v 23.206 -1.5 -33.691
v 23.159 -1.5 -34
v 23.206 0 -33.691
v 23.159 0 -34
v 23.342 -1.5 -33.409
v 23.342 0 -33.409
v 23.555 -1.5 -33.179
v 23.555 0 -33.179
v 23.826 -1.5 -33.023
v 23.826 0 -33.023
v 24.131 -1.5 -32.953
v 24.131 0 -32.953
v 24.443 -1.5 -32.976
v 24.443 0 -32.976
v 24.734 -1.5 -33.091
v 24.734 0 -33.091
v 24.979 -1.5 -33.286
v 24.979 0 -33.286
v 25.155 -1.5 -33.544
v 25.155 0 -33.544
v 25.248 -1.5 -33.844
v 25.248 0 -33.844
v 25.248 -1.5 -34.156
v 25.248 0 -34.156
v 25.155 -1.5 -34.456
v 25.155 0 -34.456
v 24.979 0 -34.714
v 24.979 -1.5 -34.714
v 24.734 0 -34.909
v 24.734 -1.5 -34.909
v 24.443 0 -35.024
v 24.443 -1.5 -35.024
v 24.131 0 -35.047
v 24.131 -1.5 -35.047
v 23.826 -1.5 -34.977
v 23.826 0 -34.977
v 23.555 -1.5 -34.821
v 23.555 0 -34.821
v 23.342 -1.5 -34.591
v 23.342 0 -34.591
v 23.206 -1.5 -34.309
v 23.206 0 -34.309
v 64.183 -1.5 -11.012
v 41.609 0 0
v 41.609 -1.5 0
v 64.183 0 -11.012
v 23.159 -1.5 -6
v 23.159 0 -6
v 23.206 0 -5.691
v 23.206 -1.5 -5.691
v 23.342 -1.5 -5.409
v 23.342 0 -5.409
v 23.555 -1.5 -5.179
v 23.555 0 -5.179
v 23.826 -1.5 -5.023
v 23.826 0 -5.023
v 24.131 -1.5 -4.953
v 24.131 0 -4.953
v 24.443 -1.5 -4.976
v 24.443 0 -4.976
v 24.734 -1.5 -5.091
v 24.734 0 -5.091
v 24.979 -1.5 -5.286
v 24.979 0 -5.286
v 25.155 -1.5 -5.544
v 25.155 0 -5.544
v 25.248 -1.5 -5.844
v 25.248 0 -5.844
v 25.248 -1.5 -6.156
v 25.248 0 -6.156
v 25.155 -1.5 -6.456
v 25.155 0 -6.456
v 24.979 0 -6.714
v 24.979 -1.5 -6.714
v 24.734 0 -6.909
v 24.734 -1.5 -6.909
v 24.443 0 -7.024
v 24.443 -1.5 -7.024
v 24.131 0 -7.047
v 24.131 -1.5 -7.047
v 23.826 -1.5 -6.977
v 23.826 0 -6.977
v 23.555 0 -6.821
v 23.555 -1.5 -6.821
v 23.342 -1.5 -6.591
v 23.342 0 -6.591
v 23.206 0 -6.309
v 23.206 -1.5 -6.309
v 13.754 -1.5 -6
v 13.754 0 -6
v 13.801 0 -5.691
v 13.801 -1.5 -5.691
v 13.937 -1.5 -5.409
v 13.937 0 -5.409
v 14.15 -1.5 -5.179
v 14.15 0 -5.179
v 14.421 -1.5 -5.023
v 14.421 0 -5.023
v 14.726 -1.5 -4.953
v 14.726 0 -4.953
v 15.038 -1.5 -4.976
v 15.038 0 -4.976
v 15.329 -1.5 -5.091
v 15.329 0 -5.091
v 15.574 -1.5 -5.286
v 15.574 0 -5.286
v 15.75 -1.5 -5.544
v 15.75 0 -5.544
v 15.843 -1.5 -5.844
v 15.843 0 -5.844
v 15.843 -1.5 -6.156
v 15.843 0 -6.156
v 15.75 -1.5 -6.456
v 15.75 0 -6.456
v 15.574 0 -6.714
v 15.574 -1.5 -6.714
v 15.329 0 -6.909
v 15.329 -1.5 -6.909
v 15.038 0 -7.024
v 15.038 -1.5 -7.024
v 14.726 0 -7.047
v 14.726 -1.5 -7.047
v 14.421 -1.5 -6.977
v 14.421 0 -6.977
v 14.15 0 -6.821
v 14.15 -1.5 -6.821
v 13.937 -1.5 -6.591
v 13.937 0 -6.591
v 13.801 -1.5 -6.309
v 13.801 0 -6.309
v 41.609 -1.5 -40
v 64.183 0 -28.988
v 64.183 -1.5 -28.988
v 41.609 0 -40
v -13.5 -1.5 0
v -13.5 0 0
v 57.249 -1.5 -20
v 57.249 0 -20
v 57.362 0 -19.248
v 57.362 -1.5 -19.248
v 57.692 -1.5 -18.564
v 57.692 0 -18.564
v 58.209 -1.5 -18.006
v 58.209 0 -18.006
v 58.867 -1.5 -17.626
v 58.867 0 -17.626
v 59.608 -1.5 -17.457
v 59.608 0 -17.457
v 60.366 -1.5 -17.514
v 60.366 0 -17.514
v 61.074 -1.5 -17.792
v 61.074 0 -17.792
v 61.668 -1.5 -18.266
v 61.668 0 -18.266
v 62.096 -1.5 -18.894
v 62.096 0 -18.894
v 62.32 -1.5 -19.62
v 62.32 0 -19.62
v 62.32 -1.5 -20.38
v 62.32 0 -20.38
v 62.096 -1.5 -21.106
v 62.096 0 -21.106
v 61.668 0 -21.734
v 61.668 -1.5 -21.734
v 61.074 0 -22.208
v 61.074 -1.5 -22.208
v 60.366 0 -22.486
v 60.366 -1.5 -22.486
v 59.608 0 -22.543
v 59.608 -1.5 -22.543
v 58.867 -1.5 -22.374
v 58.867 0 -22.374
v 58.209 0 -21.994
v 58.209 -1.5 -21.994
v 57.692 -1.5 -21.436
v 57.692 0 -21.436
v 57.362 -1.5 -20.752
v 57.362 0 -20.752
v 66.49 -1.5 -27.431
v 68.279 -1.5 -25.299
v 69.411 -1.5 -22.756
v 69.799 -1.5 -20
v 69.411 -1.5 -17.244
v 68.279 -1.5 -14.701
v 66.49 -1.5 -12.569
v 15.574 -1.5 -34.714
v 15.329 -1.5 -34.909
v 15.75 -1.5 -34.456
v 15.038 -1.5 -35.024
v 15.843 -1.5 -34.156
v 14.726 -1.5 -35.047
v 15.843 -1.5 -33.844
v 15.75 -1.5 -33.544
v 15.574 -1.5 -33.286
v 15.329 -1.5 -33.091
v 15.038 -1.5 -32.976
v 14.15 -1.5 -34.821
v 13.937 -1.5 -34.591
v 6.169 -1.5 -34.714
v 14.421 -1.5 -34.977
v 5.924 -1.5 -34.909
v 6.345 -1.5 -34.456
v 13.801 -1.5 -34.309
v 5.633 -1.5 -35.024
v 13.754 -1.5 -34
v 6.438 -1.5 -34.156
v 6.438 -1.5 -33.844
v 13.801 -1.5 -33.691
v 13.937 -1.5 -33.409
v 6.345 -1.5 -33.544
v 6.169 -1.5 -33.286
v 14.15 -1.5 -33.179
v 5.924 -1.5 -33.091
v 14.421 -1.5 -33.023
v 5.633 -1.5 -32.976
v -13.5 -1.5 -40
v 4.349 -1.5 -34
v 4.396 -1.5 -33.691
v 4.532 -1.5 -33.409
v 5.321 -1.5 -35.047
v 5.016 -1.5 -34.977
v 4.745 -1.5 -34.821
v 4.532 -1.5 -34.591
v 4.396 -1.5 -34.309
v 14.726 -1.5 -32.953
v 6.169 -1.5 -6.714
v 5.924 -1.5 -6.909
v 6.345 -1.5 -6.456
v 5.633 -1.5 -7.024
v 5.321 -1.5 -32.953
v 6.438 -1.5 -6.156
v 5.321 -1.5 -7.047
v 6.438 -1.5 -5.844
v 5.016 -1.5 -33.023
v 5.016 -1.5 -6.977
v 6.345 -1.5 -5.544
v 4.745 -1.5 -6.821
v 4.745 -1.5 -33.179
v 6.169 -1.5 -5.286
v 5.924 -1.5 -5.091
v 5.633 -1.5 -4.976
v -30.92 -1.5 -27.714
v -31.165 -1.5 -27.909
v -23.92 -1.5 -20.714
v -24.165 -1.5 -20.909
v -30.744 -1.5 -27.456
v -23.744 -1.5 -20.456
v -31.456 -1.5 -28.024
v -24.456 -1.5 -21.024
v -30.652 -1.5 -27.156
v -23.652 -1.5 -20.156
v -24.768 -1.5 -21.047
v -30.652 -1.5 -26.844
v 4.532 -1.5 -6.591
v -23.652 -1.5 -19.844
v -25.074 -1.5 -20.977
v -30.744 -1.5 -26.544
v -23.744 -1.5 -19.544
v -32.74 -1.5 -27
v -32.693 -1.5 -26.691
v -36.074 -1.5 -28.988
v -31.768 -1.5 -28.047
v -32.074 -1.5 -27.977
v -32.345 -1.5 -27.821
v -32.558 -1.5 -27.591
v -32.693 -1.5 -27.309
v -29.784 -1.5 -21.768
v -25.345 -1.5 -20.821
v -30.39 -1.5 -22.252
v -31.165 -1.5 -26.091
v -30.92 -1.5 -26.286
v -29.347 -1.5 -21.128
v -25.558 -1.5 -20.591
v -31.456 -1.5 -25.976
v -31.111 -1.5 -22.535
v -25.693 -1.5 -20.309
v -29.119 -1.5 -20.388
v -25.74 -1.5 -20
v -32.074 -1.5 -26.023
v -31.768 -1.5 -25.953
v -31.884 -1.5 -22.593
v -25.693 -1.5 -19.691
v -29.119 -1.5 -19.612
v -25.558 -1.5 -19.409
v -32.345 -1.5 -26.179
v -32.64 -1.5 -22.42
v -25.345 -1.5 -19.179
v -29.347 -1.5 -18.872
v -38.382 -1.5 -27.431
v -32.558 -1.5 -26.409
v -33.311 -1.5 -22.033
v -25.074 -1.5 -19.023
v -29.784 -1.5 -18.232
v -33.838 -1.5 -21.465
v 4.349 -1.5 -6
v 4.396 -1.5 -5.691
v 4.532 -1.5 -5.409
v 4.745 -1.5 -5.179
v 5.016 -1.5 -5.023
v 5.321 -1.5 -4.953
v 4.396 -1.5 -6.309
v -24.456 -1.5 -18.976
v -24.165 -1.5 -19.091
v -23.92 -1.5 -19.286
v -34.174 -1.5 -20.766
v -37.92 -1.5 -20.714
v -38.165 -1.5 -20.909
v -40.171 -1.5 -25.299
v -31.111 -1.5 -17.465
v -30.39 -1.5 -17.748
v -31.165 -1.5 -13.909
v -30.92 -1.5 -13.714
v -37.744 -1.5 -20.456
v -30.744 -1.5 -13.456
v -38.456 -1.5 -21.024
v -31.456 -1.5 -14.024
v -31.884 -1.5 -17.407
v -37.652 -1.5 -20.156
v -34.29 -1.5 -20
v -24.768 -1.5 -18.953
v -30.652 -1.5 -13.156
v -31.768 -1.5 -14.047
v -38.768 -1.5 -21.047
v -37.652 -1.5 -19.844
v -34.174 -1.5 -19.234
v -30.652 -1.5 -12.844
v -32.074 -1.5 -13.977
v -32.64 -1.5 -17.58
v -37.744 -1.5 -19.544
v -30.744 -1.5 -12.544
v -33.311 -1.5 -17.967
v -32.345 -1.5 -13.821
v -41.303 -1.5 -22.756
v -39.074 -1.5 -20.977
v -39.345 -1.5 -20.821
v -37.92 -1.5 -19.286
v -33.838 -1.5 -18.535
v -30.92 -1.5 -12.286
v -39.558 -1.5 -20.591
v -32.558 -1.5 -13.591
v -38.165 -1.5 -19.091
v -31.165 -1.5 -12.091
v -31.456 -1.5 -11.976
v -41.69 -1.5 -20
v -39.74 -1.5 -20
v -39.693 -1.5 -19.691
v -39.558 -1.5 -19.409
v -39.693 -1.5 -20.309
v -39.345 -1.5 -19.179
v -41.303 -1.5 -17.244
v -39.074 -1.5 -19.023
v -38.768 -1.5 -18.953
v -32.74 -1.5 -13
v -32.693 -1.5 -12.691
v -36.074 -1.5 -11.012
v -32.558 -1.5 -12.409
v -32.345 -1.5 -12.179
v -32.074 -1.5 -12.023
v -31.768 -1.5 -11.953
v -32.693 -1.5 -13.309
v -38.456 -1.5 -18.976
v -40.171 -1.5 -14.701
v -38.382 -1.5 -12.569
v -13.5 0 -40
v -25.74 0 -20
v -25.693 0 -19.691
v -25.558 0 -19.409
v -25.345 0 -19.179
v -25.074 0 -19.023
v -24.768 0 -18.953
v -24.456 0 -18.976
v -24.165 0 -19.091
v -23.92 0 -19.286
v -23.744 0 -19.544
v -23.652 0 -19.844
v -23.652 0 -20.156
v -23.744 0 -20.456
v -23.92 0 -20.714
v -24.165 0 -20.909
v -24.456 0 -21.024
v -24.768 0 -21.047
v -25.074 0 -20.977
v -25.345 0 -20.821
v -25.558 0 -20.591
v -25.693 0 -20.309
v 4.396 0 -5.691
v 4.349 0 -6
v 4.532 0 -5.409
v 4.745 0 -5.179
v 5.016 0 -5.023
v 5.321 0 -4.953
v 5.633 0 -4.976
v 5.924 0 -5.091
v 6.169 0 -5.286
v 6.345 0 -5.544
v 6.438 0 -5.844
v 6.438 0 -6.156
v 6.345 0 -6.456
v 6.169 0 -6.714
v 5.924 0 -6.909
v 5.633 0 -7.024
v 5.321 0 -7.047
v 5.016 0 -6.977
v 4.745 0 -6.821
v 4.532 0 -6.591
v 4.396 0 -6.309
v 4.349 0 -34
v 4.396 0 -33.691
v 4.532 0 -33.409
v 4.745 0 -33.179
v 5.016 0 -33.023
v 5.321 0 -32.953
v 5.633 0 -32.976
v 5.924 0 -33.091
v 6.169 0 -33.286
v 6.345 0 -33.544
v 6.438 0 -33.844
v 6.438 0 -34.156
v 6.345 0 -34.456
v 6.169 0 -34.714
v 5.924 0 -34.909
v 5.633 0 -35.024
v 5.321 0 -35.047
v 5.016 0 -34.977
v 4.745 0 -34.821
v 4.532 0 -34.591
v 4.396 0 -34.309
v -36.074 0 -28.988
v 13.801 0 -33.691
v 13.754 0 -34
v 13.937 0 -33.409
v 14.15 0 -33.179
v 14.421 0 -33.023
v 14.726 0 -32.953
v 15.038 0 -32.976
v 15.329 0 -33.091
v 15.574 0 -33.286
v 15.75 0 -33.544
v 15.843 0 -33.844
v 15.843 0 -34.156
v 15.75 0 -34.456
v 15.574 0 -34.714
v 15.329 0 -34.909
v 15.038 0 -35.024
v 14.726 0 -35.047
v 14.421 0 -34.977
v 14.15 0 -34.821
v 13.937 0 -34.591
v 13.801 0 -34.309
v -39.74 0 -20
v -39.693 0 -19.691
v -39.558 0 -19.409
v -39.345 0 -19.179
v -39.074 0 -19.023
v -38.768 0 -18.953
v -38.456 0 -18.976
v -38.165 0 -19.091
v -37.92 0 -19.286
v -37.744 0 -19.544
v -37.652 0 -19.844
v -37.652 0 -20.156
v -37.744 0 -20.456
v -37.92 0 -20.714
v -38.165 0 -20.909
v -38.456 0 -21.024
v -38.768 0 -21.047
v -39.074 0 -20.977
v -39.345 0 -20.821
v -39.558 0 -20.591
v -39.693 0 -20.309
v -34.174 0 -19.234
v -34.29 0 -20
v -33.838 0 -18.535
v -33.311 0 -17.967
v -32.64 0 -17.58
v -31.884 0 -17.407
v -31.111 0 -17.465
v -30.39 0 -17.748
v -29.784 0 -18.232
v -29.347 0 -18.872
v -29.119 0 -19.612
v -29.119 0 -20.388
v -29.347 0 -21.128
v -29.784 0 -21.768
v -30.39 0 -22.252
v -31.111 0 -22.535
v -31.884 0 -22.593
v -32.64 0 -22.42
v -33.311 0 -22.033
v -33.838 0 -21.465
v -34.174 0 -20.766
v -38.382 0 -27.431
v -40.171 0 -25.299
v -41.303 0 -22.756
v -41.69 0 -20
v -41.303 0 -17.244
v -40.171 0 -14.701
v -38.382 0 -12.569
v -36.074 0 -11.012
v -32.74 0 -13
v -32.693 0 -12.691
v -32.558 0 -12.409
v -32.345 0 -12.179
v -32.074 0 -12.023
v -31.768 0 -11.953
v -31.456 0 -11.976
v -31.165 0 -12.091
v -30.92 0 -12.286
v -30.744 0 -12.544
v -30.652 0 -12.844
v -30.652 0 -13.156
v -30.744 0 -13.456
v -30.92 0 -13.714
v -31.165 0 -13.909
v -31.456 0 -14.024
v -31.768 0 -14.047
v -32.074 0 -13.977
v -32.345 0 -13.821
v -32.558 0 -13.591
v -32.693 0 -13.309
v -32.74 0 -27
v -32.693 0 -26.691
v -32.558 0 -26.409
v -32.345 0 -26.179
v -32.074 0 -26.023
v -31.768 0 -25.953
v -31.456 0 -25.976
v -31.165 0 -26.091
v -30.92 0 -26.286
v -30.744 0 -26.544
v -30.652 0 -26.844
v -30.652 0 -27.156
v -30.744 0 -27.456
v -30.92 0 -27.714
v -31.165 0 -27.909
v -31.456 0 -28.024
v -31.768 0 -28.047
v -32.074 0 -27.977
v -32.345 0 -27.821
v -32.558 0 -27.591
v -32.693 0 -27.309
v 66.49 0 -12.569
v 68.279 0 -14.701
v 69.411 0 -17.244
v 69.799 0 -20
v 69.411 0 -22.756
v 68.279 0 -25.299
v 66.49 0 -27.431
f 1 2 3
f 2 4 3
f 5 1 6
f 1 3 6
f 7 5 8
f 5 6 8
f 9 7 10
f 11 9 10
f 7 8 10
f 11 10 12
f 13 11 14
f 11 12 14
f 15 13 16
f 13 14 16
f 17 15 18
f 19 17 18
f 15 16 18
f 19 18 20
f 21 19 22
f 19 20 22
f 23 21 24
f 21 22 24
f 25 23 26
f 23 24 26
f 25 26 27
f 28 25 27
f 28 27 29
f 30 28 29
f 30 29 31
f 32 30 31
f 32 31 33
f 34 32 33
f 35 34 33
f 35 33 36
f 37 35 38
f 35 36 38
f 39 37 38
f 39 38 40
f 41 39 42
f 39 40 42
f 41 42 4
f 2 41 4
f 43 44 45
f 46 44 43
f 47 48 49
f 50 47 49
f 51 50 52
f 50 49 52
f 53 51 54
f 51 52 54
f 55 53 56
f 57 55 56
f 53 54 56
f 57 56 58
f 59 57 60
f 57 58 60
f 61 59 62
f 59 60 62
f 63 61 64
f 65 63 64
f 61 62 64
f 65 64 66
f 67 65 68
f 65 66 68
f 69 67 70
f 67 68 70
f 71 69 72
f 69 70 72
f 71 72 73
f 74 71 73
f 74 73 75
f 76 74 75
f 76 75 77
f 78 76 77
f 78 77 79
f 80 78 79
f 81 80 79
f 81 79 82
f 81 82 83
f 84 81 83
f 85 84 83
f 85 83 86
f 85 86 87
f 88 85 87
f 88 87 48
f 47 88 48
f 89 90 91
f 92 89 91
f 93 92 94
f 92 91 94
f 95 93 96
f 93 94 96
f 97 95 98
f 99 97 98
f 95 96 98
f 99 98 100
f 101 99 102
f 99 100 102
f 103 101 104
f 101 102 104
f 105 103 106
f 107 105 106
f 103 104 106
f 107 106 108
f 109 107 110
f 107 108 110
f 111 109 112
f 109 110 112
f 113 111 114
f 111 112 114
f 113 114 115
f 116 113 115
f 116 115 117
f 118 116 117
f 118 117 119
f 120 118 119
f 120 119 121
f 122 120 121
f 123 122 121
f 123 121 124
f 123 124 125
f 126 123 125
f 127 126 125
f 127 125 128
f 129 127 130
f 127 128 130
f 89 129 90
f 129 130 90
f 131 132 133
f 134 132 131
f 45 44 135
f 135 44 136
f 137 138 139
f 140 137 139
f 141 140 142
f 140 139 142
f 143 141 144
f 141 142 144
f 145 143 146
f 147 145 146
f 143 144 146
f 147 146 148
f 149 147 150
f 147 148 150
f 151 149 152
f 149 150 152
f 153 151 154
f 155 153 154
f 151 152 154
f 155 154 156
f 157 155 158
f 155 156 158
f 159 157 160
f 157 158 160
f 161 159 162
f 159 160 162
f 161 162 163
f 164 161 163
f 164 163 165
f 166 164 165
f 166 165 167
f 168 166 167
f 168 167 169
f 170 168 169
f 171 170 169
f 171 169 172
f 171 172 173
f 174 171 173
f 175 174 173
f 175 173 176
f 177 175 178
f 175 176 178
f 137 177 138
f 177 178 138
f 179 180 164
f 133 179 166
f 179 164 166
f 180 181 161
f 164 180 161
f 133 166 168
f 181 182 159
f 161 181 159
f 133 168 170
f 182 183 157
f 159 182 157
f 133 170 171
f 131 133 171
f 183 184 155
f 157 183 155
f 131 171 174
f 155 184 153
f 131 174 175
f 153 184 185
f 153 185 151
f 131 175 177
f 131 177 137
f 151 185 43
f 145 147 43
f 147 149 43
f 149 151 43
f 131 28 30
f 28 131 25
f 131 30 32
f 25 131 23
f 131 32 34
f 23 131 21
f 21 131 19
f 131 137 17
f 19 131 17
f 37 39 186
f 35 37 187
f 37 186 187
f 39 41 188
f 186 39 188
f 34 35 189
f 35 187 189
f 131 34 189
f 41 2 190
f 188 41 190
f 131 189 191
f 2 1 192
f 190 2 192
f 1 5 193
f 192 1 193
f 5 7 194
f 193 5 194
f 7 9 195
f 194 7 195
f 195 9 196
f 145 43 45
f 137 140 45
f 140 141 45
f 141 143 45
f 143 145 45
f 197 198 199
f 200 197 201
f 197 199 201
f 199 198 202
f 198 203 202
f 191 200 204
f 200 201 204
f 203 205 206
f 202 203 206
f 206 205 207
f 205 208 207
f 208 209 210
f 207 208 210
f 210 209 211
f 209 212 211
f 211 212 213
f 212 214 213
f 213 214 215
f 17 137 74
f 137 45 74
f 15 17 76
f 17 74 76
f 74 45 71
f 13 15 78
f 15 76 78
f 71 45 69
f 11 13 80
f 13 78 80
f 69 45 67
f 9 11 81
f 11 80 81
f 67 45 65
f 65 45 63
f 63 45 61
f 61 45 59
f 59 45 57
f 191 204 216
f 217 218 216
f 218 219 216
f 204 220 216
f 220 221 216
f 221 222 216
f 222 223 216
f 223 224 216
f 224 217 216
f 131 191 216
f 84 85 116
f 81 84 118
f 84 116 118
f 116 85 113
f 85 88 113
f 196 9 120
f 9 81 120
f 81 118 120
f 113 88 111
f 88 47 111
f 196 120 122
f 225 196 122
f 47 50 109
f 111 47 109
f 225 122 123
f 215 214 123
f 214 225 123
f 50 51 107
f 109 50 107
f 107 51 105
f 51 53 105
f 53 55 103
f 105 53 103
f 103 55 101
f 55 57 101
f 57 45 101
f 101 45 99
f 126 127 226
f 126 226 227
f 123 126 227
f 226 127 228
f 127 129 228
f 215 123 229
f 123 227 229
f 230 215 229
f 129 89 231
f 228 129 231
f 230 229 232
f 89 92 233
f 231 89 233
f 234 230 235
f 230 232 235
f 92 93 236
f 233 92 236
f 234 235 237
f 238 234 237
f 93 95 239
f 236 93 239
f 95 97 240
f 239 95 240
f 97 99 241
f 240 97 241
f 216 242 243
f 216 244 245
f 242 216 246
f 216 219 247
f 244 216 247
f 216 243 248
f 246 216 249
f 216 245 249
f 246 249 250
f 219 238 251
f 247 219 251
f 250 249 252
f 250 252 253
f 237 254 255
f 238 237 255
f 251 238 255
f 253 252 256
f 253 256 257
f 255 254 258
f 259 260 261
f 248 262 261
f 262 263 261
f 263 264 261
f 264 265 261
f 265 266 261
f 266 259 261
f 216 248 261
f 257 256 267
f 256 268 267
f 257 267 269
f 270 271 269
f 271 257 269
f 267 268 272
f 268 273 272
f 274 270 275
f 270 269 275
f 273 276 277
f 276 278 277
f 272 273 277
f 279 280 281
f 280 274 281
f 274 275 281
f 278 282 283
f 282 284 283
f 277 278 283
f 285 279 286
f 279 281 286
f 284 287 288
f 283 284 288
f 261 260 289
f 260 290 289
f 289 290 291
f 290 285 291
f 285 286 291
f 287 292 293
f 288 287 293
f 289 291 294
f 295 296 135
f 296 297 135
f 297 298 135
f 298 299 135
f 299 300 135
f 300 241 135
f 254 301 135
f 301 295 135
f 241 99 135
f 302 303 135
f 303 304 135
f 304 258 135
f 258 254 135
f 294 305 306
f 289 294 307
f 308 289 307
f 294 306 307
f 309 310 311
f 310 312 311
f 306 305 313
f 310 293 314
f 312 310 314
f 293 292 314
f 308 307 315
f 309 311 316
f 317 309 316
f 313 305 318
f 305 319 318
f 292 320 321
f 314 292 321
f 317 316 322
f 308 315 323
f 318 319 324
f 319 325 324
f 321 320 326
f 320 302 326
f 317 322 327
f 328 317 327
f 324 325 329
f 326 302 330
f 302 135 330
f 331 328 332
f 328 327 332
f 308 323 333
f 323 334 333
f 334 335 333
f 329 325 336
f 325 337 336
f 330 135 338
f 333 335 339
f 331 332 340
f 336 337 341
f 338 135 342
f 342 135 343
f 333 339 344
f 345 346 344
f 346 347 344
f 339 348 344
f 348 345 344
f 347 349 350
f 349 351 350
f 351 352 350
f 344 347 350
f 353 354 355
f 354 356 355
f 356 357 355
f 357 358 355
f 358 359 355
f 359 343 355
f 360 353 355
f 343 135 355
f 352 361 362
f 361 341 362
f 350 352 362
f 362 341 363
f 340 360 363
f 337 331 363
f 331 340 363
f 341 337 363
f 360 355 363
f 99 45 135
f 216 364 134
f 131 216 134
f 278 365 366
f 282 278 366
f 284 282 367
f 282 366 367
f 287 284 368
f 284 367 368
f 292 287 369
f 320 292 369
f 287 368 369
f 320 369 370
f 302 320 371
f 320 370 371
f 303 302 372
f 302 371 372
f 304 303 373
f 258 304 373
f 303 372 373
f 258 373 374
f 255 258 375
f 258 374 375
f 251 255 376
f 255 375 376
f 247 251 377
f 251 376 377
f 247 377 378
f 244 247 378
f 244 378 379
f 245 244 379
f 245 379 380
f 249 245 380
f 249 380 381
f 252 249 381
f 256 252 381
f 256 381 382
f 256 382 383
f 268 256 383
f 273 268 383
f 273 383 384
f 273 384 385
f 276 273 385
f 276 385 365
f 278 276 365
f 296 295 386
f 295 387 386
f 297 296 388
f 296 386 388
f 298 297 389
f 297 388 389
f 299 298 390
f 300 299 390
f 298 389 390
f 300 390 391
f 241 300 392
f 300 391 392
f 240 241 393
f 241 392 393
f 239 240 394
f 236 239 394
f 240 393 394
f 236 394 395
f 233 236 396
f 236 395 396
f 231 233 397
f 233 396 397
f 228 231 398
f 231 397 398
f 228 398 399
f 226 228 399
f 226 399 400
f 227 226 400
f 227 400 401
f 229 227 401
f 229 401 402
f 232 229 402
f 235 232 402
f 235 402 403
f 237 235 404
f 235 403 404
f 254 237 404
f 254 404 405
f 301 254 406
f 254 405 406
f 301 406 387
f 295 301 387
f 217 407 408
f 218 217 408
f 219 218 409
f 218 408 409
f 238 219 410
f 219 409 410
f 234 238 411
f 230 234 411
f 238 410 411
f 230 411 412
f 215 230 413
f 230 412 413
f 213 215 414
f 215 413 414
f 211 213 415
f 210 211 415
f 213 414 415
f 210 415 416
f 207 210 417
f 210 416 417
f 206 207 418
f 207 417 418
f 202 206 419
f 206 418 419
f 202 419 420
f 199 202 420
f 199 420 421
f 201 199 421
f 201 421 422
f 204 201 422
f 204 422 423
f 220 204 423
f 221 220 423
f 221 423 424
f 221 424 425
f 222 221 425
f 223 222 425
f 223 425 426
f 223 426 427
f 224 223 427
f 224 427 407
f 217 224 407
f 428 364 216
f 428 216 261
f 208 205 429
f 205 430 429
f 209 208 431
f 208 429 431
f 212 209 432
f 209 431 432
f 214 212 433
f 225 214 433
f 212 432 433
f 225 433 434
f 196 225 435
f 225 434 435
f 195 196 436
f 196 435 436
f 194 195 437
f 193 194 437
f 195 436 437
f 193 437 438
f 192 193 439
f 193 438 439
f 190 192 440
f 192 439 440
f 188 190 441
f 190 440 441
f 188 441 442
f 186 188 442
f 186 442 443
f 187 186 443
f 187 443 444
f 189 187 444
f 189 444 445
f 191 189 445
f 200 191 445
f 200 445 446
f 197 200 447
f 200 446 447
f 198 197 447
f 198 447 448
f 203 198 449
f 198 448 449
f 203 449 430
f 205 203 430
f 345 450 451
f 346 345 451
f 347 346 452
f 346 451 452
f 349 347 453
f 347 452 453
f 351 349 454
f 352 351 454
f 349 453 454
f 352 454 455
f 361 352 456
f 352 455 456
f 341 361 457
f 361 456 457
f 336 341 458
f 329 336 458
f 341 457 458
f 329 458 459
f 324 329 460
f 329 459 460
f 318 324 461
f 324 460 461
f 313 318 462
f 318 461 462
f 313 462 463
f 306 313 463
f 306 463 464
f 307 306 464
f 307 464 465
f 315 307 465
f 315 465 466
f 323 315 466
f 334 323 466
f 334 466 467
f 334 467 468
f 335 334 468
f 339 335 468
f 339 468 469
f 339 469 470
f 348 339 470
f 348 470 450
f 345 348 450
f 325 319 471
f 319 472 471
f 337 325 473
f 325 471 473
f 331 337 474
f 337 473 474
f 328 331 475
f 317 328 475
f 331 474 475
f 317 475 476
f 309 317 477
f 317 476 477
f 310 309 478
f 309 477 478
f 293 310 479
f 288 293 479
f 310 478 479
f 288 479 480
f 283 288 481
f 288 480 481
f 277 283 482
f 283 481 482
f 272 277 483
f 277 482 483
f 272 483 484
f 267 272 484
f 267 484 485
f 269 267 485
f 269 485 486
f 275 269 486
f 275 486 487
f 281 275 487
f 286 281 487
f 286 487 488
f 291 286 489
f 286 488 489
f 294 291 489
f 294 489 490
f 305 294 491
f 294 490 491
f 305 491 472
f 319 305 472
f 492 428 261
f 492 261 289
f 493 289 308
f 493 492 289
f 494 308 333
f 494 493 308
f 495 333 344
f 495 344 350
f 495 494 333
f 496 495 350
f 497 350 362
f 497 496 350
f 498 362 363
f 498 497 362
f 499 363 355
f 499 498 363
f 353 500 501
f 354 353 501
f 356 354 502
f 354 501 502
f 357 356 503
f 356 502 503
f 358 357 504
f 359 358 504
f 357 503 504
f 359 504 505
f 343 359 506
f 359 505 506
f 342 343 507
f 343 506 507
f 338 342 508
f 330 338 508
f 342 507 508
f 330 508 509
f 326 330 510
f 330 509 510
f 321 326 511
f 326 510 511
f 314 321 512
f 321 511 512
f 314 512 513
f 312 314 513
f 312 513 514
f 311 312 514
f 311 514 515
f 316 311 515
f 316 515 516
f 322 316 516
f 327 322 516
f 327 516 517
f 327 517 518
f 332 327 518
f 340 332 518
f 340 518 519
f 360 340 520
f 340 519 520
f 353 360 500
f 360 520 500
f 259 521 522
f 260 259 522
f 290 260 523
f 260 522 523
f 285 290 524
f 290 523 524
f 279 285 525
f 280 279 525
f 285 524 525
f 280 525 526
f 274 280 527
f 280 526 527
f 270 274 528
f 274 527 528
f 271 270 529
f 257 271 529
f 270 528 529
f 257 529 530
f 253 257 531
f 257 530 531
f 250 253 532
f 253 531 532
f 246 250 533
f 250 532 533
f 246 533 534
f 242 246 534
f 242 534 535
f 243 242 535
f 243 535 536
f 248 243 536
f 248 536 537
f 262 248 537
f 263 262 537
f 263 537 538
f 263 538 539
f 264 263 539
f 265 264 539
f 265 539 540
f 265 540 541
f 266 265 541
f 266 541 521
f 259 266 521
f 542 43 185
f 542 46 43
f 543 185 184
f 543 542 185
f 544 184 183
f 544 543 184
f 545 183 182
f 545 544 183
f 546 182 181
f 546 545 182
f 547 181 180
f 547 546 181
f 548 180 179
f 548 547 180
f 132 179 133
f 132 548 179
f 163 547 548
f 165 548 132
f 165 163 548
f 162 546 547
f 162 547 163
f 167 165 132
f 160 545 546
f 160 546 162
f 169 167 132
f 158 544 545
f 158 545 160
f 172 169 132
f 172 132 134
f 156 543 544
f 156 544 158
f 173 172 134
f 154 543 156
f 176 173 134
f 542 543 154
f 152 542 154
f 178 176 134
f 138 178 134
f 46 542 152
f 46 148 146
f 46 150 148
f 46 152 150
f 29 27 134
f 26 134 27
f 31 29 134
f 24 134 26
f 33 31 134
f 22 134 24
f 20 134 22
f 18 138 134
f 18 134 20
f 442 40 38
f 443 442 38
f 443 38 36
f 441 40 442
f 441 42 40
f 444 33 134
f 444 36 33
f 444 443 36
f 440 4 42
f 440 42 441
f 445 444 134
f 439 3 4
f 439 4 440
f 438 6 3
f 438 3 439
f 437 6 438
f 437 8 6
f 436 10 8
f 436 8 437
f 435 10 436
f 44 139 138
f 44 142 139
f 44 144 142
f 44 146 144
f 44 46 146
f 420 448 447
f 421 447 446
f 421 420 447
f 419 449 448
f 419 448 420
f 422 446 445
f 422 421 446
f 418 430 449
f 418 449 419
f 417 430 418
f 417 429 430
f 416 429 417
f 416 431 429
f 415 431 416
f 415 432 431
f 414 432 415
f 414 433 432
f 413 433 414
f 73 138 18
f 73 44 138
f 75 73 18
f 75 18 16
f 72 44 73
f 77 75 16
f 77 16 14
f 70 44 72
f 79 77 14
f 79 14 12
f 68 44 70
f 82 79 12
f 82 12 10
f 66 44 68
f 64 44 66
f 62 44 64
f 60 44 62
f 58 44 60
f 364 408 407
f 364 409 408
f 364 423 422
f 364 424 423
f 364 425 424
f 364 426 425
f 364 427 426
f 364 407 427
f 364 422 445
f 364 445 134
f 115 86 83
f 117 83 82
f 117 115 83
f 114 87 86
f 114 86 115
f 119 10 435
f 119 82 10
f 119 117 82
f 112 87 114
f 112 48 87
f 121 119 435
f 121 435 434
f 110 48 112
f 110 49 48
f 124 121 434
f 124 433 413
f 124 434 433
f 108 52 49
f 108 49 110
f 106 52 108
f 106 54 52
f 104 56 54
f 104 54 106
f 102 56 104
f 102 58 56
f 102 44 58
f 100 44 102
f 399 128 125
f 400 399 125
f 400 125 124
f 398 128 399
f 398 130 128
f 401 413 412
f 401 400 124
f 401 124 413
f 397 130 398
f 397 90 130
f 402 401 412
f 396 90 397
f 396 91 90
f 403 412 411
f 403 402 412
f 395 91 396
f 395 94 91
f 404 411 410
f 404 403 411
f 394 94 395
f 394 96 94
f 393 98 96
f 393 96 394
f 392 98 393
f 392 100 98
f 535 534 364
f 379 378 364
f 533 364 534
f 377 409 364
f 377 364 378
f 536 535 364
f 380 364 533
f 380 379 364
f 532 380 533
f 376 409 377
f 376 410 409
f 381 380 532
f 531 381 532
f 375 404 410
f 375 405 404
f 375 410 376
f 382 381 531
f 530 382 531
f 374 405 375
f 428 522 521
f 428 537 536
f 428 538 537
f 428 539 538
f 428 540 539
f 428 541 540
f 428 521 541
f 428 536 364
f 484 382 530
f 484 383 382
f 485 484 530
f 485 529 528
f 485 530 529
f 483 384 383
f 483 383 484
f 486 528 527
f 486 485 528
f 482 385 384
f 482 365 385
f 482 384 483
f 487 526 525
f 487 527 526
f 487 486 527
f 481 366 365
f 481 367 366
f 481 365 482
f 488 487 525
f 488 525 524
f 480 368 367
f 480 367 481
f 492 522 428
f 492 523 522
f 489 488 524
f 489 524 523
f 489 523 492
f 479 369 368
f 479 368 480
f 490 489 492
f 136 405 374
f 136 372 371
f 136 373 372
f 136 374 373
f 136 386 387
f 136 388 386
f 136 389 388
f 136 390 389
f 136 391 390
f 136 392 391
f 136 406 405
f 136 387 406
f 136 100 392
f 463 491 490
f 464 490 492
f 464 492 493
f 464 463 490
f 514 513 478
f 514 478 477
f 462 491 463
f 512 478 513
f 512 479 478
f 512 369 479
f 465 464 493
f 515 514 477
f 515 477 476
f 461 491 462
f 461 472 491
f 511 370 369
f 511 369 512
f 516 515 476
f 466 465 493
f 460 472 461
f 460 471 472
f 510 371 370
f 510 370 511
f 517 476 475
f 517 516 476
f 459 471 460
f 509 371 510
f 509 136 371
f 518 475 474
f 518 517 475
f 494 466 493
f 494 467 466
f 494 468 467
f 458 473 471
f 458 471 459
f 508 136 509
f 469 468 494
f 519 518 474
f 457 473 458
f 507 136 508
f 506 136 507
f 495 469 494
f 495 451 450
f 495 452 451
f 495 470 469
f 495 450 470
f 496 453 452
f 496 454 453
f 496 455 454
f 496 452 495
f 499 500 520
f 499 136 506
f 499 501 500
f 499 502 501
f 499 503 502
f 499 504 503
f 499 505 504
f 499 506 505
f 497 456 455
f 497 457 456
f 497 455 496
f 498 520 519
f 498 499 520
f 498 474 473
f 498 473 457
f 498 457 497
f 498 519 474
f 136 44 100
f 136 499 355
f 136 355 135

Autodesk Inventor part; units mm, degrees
ref_plane "YZ Plane" through (0, 0, 0) normal (1, 0, 0) x (0, 1, 0)
ref_plane "XZ Plane" through (0, 0, 0) normal (0, 1, 0) x (-1, 0, 0)
ref_plane "XY Plane" through (0, 0, 0) normal (0, 0, 1) x (1, 0, 0)
sketch "Sketch1" plane through (0, 0, 0) normal (0, 1, 0) x (-1, 0, 0)
  line L0 (-0.4496, -40) -> (-0.4496, 0)
  line L1 (-27.6589, 0) -> (-27.6589, -40)
  circle A0 centre (-5.3993, -34) radius 1.05
  circle A1 centre (-14.8043, -34) radius 1.05
  circle A2 centre (-24.2093, -34) radius 1.05
  circle A3 centre (-24.2093, -6) radius 1.05
  circle A4 centre (-14.8043, -6) radius 1.05
  circle A5 centre (-5.3993, -6) radius 1.05
  circle A6 centre (-59.7986, -20) radius 2.55
  circle A7 centre (31.69, -20) radius 2.6
  circle A8 centre (24.69, -20) radius 1.05
  circle A9 centre (31.69, -13) radius 1.05
  circle A10 centre (31.69, -27) radius 1.05
  circle A11 centre (38.69, -20) radius 1.05
  line L2 (36.0744, -11.0124) -> (13.5, 0)
  line L3 (-41.6086, 0) -> (-64.183, -11.0124)
  line L4 (13.5, -40) -> (36.0744, -28.9876)
  line L5 (-64.183, -28.9876) -> (-41.6086, -40)
  arc A12 (36.0744, -28.9876) -> (36.0744, -11.0124) centre (31.69, -20) ccw
  arc A13 (-64.183, -11.0124) -> (-64.183, -28.9876) centre (-59.7986, -20) ccw
  line L6 (-41.6086, 0) -> (13.5, 0)
  line L7 (13.5, -40) -> (-41.6086, -40)
  line L8 (-28.1086, -40) -> (-28.1086, 0)
  line L9 (-27.2093, 0) -> (-27.2093, -40)
  line L10 (-0.8993, -40) -> (-0.8993, 0)
  line L11 (0, 0) -> (0, -40)
extrude "Extrusion1" add sketch "Sketch1" against normal blind 1.5
properties part number "CAM_axis_6_supplement_frame"
